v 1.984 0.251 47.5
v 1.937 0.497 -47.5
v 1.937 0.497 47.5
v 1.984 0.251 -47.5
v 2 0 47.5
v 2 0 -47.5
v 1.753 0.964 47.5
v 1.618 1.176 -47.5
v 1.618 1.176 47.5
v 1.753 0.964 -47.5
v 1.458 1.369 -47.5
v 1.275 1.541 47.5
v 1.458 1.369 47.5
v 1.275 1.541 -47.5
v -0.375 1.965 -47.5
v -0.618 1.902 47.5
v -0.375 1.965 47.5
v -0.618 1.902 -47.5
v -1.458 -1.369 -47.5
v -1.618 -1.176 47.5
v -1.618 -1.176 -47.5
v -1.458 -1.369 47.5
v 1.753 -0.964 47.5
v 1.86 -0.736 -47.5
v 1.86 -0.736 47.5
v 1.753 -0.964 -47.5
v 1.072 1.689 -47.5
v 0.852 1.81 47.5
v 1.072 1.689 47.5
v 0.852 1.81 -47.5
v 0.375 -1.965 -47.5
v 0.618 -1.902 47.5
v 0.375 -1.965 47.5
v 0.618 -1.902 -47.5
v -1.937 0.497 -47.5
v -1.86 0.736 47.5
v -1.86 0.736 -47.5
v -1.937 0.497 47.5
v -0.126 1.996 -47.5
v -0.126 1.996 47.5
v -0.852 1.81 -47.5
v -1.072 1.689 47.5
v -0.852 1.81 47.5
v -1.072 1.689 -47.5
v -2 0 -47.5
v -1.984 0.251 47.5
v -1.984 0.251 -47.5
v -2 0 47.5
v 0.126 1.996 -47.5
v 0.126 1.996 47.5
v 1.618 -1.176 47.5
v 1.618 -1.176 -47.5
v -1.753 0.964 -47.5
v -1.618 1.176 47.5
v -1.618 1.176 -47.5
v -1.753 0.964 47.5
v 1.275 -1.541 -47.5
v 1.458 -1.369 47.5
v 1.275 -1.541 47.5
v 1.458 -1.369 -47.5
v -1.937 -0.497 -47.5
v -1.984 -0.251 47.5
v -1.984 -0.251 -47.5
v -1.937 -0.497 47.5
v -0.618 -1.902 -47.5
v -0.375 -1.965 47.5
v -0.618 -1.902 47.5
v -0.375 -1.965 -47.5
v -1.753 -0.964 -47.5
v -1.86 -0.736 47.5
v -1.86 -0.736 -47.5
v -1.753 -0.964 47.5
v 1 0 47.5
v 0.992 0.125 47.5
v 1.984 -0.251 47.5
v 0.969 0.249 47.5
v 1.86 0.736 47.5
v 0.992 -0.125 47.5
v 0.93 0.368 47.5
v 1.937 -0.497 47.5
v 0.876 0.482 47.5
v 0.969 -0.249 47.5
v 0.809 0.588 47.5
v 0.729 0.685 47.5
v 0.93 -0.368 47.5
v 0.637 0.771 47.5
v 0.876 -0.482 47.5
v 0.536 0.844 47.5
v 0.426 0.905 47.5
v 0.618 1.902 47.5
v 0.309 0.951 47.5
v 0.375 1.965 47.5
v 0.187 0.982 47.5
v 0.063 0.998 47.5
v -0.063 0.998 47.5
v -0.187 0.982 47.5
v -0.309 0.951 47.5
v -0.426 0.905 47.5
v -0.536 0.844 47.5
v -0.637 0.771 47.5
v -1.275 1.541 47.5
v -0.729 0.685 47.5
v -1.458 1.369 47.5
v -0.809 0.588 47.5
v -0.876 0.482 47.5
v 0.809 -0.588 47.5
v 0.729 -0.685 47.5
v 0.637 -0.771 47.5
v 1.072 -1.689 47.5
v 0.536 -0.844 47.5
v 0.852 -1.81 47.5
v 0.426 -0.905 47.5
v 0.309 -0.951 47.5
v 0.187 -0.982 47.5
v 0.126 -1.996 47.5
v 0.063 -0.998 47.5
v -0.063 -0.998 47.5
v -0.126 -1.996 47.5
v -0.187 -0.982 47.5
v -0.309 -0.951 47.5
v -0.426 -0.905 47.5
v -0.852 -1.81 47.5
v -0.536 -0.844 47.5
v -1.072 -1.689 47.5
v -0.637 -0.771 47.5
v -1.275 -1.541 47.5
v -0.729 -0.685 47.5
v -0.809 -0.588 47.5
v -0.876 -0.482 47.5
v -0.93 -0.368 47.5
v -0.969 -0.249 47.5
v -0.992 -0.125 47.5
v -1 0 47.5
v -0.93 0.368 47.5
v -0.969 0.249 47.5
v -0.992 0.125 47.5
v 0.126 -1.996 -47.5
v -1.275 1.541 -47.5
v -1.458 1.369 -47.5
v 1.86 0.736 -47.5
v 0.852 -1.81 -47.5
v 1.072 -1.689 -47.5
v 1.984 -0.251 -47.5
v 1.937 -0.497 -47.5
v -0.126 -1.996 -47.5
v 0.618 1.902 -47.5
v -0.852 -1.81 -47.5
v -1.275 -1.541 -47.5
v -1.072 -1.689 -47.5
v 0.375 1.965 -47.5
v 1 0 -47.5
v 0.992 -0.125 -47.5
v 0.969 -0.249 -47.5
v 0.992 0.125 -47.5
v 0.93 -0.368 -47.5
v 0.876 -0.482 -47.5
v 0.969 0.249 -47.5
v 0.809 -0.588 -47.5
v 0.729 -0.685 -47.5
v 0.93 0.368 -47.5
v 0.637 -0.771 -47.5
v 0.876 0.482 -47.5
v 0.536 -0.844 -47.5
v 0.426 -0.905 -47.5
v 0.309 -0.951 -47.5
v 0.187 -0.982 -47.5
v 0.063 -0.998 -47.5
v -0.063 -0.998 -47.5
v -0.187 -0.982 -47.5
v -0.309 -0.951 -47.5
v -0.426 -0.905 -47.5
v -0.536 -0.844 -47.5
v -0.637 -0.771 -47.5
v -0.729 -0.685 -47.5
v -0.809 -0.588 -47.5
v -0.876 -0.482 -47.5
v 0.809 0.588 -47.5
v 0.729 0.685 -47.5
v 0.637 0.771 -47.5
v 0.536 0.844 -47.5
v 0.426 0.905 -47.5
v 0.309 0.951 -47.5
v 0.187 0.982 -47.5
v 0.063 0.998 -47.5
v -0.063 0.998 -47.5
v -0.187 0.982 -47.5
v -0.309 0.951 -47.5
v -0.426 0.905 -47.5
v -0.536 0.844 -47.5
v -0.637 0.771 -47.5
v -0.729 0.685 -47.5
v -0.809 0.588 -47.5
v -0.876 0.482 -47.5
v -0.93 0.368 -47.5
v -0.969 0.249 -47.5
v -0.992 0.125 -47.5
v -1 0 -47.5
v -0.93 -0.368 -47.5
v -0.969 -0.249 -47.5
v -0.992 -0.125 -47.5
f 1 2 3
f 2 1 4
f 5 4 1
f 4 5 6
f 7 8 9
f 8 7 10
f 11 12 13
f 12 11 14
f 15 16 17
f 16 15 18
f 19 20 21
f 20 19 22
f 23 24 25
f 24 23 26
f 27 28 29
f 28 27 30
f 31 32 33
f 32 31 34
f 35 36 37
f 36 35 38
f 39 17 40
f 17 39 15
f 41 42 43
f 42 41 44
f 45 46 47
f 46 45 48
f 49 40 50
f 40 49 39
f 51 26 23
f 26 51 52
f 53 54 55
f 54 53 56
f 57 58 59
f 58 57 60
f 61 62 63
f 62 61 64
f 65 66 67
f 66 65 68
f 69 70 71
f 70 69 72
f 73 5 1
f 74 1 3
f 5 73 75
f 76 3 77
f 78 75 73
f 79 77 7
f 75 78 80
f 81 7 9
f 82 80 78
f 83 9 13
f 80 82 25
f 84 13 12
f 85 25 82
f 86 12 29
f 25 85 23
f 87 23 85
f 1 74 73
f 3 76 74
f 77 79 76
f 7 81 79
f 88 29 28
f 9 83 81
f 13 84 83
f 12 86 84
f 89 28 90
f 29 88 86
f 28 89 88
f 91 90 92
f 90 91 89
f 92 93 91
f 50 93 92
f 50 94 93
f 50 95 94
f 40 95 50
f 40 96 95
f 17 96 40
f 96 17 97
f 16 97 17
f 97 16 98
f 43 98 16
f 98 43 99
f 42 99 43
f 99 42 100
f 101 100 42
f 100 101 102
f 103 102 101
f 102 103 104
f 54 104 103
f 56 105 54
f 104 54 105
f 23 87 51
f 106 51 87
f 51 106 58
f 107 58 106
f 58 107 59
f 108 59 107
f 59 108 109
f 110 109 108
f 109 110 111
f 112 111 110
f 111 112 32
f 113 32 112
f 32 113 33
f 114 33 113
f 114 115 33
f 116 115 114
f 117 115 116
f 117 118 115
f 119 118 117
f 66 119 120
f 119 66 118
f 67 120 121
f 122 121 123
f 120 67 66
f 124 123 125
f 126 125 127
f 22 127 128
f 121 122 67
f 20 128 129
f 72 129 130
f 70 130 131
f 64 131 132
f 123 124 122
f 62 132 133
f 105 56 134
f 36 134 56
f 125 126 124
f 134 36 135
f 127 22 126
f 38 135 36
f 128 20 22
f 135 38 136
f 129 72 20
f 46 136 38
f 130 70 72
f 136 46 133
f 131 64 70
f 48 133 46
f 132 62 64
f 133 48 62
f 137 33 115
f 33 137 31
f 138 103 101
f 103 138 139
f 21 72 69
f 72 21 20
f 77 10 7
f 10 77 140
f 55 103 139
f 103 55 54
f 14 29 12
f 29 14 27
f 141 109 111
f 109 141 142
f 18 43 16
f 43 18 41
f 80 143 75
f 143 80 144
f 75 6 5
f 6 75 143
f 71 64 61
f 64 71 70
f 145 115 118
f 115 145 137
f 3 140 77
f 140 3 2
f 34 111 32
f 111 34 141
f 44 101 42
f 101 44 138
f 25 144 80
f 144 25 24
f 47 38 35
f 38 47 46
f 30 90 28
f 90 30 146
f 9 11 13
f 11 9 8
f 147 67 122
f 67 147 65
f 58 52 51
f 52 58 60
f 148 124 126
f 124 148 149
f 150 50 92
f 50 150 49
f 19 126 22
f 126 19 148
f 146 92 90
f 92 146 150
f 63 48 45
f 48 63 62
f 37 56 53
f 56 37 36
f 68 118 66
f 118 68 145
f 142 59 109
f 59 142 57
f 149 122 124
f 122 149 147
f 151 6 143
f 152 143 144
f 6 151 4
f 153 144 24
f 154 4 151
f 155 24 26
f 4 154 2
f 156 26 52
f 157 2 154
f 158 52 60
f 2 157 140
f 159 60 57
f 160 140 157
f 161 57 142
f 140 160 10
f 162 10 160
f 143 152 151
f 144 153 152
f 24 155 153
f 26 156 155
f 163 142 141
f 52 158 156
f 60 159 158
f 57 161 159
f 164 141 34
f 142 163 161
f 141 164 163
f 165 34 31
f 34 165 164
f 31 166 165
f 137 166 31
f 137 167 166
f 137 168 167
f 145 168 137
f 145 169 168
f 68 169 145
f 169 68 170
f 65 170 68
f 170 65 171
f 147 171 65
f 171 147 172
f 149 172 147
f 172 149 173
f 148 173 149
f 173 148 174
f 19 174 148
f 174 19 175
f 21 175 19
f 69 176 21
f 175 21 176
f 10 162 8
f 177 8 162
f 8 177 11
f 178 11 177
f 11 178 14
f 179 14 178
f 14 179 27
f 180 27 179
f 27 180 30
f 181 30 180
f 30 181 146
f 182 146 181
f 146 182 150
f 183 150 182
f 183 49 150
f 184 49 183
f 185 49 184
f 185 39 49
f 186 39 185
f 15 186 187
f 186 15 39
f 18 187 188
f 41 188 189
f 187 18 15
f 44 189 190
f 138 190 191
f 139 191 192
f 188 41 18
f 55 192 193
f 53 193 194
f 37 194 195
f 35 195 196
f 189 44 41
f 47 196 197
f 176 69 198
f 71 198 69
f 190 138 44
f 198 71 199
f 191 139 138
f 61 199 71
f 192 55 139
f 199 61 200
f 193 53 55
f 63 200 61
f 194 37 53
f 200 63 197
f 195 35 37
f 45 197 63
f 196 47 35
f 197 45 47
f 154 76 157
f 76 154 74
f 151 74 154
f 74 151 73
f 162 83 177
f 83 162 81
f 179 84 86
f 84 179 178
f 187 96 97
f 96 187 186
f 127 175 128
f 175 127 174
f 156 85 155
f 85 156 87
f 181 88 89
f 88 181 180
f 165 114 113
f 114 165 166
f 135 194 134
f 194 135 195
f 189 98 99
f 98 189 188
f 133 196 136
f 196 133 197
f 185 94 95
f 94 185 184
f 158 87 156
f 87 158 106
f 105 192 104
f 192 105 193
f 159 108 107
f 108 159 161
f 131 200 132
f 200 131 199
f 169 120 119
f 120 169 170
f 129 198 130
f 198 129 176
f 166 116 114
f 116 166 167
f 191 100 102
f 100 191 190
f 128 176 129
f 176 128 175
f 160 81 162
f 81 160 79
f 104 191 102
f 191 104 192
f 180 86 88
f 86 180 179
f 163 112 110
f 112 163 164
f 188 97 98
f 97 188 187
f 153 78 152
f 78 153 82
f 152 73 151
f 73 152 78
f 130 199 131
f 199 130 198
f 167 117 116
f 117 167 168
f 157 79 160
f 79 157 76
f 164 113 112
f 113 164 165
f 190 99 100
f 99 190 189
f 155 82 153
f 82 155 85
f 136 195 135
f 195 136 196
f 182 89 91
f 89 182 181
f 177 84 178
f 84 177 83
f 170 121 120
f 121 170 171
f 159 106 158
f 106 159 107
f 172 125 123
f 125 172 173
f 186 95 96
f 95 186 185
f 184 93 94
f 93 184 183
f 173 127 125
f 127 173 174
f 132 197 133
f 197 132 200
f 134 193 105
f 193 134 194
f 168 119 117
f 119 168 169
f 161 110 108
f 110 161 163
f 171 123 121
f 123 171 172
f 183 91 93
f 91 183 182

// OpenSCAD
$fn = 50;


difference() {
	union() {
		translate(v = [0, 0, -47.5000000000]) {
			cylinder(h = 95, r = 2.0000000000);
		}
	}
	union() {
		translate(v = [0, 0, -100.0000000000]) {
			cylinder(h = 200, r = 1.0000000000);
		}
	}
}
